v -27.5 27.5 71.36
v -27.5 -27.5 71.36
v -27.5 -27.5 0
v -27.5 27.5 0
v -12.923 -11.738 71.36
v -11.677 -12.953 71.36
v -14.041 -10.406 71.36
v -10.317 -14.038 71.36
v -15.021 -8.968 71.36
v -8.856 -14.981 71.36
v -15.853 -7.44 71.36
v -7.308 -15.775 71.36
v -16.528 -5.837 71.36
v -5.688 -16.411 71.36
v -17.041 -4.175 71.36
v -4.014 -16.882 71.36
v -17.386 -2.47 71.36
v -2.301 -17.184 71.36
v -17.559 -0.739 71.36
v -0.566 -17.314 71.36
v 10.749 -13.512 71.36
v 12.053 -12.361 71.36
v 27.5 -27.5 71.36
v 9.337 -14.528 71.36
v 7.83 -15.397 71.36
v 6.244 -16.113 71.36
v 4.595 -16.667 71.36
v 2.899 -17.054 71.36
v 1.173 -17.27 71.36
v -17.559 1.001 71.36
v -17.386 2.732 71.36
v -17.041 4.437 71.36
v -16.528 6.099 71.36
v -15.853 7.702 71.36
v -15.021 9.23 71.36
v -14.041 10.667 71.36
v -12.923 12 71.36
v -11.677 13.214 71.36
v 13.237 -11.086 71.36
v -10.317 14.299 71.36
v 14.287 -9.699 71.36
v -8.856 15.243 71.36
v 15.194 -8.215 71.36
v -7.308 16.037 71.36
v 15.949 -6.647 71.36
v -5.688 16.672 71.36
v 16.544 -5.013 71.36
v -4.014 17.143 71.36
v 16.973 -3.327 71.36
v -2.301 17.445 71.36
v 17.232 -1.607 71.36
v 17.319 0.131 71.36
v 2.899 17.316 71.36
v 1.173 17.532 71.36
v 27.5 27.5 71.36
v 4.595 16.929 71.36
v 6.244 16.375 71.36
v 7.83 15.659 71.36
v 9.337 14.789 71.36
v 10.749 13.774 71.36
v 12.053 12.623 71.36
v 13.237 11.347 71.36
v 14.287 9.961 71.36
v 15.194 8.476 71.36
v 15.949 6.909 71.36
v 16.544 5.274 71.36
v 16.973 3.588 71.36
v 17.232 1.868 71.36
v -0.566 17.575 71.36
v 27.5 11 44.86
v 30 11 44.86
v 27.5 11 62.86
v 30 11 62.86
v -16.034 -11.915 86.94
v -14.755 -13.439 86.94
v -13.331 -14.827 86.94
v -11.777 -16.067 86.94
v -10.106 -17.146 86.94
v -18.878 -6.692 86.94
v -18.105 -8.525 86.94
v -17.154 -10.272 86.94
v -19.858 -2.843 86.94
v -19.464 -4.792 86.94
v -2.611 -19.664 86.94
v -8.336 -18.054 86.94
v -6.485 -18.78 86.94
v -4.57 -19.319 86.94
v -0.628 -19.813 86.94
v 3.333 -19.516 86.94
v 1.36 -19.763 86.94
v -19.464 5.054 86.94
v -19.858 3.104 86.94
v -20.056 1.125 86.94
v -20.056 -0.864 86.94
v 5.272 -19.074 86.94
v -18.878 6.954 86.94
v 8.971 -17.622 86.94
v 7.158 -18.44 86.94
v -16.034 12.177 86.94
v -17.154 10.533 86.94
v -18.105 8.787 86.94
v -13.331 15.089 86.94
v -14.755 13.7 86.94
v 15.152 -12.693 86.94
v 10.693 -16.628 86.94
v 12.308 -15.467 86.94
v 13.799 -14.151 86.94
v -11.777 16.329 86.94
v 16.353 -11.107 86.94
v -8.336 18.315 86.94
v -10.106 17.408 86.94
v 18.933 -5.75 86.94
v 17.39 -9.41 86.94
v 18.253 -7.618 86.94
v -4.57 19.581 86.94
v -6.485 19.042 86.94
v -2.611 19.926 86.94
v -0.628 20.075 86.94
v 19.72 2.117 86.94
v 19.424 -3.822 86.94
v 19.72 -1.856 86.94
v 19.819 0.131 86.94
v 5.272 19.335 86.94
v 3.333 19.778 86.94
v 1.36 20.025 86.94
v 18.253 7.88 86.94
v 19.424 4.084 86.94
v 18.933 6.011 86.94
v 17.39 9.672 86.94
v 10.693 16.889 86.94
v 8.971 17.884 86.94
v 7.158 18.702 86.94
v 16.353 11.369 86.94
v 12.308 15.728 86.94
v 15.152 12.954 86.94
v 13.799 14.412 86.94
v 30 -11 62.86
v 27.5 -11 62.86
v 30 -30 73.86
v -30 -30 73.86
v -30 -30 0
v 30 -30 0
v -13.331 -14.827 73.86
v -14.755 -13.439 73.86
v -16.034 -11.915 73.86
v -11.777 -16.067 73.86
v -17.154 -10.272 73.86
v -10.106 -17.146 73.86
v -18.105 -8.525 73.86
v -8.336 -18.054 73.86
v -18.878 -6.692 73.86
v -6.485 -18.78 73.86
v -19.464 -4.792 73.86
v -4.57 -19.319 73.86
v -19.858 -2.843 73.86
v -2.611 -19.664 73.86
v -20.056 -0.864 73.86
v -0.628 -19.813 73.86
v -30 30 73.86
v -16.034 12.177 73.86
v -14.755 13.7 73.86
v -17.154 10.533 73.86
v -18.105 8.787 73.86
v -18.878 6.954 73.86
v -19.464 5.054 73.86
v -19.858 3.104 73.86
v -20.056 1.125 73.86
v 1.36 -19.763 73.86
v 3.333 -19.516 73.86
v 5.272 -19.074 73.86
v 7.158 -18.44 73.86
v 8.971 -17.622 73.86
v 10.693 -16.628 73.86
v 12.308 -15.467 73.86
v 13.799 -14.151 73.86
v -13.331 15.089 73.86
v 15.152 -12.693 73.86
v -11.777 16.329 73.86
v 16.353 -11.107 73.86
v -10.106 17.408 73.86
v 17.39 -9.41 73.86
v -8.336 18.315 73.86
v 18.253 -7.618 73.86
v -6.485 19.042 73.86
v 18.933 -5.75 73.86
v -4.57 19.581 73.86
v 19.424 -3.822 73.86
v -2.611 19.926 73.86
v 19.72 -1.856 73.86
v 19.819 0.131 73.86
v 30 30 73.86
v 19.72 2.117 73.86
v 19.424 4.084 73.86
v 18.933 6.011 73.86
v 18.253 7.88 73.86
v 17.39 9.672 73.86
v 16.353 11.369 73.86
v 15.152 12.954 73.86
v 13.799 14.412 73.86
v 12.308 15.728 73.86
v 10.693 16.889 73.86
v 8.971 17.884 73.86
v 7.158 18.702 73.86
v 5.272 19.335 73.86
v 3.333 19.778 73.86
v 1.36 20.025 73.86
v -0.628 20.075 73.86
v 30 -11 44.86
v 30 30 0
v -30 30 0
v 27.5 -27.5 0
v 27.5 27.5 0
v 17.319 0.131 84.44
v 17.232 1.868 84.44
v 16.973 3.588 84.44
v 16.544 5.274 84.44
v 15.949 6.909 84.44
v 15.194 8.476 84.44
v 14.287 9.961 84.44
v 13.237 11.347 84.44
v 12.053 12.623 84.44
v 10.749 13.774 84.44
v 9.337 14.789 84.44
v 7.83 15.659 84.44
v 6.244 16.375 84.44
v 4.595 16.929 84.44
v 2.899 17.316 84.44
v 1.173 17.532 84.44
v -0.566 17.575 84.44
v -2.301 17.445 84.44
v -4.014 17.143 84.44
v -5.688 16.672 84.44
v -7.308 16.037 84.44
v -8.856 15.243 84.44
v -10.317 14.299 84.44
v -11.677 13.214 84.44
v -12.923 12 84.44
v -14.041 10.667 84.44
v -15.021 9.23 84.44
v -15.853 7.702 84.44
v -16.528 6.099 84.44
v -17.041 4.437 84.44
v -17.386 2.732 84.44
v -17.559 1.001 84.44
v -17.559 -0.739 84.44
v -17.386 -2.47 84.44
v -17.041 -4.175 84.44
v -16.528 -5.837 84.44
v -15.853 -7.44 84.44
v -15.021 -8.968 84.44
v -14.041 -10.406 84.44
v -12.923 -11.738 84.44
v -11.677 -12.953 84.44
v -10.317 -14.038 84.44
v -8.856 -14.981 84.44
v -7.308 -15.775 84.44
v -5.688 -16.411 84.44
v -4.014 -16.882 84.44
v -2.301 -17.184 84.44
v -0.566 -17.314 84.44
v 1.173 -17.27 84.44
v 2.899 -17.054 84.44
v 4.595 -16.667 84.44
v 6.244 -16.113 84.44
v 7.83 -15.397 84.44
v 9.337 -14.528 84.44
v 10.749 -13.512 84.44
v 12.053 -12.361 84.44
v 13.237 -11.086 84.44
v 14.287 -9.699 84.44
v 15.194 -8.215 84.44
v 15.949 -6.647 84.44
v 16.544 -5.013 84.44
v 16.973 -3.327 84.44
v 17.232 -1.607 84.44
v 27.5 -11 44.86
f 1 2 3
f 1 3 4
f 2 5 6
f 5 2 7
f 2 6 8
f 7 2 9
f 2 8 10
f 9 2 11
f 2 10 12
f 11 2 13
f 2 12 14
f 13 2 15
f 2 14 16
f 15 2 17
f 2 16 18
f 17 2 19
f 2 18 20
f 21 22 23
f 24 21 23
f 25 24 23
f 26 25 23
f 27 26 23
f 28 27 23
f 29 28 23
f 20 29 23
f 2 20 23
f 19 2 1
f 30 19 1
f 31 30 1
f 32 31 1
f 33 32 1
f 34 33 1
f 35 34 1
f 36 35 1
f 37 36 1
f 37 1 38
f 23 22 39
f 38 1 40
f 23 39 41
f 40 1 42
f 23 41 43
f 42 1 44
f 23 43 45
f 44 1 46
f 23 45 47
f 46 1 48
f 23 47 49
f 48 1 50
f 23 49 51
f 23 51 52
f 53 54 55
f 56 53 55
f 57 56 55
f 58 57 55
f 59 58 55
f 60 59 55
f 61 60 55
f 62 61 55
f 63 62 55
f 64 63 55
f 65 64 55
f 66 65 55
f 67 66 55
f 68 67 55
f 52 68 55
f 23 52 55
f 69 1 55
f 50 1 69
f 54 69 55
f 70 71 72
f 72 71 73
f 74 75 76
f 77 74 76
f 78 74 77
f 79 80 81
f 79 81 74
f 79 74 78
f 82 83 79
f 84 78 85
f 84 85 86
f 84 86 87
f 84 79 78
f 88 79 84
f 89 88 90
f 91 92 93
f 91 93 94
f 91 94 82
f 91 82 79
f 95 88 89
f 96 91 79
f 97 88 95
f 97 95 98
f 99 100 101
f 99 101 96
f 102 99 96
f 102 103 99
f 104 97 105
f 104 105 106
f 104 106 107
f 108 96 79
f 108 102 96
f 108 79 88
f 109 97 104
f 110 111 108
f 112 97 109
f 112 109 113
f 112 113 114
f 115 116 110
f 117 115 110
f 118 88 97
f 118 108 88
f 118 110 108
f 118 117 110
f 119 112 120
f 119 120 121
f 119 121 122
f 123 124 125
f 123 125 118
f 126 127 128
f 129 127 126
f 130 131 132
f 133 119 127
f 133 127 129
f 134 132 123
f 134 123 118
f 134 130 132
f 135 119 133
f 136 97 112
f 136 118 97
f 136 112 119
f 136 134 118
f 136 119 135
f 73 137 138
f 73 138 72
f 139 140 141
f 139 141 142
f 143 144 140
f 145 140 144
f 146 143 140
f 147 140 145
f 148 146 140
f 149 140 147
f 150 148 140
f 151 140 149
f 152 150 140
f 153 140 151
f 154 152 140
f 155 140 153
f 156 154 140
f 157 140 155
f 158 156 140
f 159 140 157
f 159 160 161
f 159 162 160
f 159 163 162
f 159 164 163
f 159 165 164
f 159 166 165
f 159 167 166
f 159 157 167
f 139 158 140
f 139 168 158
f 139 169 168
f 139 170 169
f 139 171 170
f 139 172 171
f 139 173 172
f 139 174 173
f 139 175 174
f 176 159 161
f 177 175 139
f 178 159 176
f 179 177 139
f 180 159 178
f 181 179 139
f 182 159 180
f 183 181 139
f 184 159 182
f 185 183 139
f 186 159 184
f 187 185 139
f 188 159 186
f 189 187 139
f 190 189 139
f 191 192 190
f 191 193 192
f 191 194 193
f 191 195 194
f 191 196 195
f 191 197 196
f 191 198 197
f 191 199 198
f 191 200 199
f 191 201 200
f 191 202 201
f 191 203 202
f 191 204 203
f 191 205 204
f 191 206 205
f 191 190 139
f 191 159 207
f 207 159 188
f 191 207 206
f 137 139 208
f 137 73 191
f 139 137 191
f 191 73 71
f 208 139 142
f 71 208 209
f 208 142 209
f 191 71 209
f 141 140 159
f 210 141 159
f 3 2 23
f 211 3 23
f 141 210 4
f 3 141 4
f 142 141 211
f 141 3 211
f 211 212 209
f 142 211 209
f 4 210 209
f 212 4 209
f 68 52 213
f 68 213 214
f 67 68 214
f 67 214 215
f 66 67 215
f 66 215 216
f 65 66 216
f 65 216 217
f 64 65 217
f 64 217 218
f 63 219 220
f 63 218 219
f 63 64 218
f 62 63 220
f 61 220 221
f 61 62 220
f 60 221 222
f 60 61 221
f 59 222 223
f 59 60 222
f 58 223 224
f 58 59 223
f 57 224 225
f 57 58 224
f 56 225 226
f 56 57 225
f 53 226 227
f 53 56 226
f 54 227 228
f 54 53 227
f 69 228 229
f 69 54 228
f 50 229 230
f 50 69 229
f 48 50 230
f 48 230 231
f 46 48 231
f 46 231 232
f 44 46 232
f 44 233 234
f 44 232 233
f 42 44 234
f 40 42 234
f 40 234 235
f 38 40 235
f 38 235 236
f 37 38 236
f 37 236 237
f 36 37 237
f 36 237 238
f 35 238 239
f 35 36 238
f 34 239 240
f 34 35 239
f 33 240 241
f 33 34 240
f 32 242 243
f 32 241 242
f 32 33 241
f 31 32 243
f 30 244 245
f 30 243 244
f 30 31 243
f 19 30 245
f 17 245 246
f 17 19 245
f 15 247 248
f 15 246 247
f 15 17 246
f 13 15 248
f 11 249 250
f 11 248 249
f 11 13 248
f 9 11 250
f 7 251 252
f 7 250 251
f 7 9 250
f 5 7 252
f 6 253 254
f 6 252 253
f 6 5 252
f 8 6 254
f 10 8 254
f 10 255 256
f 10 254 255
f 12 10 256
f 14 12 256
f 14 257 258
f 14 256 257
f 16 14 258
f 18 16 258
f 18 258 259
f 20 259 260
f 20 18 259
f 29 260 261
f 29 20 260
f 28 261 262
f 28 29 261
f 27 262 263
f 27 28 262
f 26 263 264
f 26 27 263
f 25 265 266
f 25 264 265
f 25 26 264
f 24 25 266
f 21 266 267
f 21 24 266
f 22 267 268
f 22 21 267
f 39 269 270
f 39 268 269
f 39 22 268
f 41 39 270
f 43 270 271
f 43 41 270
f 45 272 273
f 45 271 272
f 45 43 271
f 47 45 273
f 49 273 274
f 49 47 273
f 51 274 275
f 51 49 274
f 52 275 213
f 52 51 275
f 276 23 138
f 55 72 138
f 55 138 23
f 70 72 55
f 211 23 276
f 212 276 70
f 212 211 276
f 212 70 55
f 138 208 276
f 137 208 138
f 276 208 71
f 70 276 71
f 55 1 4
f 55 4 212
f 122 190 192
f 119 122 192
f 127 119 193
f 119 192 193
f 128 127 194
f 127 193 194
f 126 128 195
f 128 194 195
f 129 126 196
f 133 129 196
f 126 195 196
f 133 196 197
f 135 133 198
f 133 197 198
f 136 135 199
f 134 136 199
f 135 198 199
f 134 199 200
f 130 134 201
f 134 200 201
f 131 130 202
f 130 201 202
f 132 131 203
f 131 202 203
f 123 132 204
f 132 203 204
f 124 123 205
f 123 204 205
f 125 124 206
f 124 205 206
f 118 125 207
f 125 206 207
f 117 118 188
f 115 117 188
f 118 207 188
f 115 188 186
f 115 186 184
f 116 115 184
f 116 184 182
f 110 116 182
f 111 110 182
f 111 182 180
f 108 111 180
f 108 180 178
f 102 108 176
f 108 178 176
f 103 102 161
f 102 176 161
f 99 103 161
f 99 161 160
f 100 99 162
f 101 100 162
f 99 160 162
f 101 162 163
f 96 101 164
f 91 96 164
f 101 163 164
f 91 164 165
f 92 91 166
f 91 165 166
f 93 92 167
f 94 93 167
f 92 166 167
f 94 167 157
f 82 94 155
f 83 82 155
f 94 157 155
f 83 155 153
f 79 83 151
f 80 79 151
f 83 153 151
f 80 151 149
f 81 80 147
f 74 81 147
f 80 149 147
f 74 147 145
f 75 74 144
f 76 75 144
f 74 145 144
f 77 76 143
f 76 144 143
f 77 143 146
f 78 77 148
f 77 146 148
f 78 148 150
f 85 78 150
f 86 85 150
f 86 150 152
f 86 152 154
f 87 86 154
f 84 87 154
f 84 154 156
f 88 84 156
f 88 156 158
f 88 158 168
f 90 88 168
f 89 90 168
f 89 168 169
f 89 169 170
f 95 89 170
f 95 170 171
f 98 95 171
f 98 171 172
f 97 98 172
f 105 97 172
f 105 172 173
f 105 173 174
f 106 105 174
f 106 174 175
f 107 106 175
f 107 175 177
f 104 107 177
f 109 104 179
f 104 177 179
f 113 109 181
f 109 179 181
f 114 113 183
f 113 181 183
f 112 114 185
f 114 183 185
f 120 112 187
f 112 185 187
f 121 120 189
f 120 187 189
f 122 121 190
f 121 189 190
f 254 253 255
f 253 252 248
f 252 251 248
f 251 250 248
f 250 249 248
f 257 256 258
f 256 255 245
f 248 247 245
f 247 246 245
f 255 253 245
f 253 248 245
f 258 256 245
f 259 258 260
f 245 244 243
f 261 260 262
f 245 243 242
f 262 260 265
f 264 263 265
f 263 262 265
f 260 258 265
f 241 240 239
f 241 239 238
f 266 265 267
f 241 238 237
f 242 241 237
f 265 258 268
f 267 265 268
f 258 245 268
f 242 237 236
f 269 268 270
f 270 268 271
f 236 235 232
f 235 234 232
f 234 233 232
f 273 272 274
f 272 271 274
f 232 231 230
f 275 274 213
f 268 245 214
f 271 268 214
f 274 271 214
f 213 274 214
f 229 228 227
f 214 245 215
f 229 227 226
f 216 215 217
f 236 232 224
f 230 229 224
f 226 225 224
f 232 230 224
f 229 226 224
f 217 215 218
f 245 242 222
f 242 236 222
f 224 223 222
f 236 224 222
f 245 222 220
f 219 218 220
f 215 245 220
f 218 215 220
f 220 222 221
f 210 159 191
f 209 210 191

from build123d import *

# Parameters (mm, degrees)
F3_W     = 60
F3_H     = 60
F4_DEPTH = 73.86
F5_R     = 19.95
F6_DEPTH = 13.08
F8_T     = -2.5
F7_W     = 22
F7_H     = 18
F9_DEPTH = 2.5


with BuildPart() as f4:
    # F3 (on Top) → F4 (new body)
    with BuildSketch(Plane.XY):
        Rectangle(F3_W, F3_H)
    extrude(amount=F4_DEPTH)

    # F5 (on face) → F6 (join)
    with BuildSketch(Plane.XY.offset(73.86)):
        with Locations((-0.130815577, 0.1308139617)):
            Circle(F5_R)
    extrude(amount=F6_DEPTH)

    # F8
    f8_openings = [f4.faces().sort_by_distance(p)[0] for p in [
        (0, 0, 0),
    ]]
    offset(amount=F8_T, openings=f8_openings, kind=Kind.INTERSECTION)

    # F7 (on face) → F9 (cut)
    with BuildSketch(Plane.YZ.offset(30)):
        with Locations((0, 53.86)):
            Rectangle(F7_W, F7_H)
    extrude(amount=-F9_DEPTH, mode=Mode.SUBTRACT)


solid = f4.part
